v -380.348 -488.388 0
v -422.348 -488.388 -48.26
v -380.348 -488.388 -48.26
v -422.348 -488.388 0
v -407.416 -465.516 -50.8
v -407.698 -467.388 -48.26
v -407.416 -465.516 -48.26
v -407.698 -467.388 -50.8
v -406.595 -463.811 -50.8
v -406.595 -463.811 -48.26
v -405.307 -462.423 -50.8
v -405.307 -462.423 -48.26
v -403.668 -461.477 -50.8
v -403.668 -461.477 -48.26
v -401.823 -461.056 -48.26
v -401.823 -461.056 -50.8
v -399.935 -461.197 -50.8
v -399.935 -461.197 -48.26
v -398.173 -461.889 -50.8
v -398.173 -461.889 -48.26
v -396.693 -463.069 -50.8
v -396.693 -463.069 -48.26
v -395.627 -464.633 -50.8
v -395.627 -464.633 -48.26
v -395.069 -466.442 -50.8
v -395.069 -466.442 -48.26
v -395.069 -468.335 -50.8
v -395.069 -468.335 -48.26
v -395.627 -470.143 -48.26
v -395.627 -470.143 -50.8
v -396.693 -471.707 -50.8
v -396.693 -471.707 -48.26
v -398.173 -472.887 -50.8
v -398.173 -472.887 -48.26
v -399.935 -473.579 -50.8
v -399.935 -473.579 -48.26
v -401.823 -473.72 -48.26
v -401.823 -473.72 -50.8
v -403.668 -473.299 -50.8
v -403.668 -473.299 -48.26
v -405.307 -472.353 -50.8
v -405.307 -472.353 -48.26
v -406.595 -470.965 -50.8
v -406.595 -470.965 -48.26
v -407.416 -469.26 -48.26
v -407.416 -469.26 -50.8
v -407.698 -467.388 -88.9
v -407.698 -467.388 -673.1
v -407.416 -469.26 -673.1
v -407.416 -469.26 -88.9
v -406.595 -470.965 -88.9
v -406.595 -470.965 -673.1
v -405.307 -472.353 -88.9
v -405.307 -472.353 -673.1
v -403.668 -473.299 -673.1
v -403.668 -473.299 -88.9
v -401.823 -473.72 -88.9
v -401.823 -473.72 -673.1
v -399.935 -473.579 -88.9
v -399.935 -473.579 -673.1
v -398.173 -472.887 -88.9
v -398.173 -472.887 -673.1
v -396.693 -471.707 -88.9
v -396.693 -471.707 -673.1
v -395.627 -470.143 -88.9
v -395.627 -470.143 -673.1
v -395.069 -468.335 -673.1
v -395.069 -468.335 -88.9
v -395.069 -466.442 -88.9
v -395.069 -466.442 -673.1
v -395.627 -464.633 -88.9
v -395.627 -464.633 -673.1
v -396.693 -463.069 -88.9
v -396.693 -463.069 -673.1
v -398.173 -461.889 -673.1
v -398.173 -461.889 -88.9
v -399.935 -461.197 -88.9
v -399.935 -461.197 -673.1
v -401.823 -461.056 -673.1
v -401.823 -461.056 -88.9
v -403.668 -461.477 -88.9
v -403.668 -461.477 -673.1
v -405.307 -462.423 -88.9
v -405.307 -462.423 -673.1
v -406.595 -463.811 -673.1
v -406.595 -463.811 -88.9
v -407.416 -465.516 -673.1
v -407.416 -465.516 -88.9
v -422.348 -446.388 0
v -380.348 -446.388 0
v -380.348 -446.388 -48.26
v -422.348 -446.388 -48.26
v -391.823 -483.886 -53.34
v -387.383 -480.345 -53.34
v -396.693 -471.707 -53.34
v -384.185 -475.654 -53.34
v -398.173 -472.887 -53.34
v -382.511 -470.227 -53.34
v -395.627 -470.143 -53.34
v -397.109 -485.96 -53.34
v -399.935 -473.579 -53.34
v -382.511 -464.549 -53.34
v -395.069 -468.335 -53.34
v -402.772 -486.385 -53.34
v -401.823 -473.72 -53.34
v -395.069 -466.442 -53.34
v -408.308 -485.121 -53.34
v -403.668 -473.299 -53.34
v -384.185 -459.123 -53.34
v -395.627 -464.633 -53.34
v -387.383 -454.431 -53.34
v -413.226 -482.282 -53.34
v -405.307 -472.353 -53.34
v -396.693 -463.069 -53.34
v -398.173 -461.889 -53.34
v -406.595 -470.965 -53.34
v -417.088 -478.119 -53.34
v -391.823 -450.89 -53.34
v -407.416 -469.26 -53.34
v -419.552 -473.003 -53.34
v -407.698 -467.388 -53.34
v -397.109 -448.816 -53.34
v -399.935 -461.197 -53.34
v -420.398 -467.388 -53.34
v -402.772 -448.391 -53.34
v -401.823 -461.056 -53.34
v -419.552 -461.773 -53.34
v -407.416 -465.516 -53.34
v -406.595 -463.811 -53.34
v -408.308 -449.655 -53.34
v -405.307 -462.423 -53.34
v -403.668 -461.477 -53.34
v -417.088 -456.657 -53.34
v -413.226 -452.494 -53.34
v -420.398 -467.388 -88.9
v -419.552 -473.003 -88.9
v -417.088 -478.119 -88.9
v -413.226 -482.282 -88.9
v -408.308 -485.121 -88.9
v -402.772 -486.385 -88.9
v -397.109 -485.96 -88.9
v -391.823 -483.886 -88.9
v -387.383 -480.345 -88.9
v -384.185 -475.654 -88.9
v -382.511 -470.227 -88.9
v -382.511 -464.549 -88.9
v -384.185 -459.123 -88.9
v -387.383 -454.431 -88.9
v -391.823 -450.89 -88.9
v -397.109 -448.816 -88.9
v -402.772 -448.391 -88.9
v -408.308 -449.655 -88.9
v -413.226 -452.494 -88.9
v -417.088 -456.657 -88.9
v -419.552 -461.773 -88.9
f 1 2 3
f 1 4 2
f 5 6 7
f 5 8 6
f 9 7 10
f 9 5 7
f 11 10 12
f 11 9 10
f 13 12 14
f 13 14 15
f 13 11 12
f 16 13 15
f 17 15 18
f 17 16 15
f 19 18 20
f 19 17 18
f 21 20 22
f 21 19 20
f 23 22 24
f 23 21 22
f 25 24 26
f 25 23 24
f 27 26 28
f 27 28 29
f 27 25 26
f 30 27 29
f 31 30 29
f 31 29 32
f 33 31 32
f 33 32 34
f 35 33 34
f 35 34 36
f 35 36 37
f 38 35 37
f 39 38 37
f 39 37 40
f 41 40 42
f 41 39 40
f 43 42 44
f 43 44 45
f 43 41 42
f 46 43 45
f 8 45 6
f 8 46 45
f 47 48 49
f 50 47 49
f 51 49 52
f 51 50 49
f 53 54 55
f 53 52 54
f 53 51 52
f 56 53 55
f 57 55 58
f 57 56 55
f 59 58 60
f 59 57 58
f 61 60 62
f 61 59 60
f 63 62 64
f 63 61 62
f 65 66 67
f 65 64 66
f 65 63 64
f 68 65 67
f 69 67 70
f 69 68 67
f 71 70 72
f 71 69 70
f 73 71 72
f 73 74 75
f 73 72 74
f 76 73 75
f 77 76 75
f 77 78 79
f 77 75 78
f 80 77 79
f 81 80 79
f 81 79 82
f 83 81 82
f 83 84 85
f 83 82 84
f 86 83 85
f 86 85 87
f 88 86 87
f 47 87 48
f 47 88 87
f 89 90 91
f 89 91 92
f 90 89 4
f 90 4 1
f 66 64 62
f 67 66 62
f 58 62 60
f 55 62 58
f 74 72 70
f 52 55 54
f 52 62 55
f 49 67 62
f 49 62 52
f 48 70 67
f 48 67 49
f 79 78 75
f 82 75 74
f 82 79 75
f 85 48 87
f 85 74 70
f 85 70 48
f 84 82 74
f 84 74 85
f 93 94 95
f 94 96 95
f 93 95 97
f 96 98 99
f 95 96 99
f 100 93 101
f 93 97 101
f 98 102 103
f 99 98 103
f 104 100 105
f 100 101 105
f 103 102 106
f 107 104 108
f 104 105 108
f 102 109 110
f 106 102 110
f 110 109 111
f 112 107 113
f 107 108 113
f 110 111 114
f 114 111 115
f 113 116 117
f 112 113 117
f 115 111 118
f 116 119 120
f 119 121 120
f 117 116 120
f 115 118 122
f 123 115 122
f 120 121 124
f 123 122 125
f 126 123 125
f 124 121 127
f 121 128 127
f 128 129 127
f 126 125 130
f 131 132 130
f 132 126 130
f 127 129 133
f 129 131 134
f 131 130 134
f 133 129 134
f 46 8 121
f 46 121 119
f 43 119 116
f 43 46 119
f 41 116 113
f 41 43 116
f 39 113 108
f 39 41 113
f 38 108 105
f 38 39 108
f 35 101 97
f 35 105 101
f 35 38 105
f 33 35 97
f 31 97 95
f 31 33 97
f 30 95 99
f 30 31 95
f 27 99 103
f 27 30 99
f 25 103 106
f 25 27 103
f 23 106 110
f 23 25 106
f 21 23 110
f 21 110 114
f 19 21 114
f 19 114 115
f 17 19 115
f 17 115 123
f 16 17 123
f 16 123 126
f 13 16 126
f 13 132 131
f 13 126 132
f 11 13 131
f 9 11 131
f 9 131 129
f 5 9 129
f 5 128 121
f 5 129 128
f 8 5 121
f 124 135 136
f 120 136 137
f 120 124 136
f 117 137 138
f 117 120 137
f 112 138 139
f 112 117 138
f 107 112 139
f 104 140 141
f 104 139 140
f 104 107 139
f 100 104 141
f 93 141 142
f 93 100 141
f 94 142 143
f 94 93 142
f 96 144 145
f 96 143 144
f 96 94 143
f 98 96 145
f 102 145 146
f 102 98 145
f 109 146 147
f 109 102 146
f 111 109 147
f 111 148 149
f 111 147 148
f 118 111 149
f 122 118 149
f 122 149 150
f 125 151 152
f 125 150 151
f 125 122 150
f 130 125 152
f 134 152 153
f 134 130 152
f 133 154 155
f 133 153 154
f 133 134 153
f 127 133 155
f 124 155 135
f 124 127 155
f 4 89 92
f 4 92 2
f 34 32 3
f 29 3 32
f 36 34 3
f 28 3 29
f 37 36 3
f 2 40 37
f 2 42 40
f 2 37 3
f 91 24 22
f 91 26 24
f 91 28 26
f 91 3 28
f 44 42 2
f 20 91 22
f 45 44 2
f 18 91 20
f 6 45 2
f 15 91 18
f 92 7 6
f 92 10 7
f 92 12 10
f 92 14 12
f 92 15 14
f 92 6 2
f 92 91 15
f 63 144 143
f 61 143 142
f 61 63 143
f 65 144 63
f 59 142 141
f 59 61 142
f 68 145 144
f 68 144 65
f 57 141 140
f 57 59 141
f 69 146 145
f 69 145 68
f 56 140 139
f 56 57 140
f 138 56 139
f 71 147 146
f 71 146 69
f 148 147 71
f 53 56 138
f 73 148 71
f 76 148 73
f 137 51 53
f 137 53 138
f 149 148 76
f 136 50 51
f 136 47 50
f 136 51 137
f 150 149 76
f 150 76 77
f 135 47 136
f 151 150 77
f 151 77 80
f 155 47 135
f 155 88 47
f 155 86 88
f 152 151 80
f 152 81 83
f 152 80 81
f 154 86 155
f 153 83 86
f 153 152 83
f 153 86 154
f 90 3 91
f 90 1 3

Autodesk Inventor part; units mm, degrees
ref_plane "YZ Plane" through (0, 0, 0) normal (1, 0, 0) x (0, 1, 0)
ref_plane "XZ Plane" through (0, 0, 0) normal (0, 1, 0) x (-1, 0, 0)
ref_plane "XY Plane" through (0, 0, 0) normal (0, 0, 1) x (1, 0, 0)
ref_plane "Work Plane1" through (-337.8481, -441.0413, 0) normal (0, 0, 1) x (1, 0, 0)
sketch "Sketch1" plane through (-337.8481, -441.0413, 0) normal (0, 0, 1) x (1, 0, 0)
  line L0 (-84.5, -47.3468) -> (-42.5, -47.3468)
  line L1 (-42.5, -47.3468) -> (-42.5, -5.3468)
  line L2 (-42.5, -5.3468) -> (-84.5, -5.3468)
  line L3 (-84.5, -5.3468) -> (-84.5, -47.3468)
  line L4 (-84.5, -47.3468) -> (-42.5, -5.3468) construction
  line L5 (-42.5, -47.3468) -> (-84.5, -5.3468) construction
  point P0 (337.8481, 441.0413)
  point P1 (-63.5, -26.3468)
  dimension "d0" = 42
  dimension "d1" = 42
extrude "Extrusion1" add sketch "Sketch1" against normal blind 50.8
sketch "Sketch2" plane through (-337.8481, -441.0413, -50.8) normal (0, 0, -1) x (-1, 0, 0)
  line L0 (42.5, -47.3468) -> (84.5, -47.3468) projected
  line L1 (84.5, -47.3468) -> (84.5, -5.3468) projected
  line L2 (84.5, -5.3468) -> (42.5, -5.3468) projected
  line L3 (42.5, -5.3468) -> (42.5, -47.3468) projected
  circle A0 centre (63.5, -26.3468) radius 6.35
  point P0 (-337.8481, 441.0413)
  dimension "d4" = 12.7
extrude "Extrusion2" add sketch "Sketch2" along normal blind 622.3 contours A0
sketch "Sketch3" plane through (-337.8481, -441.0413, -50.8) normal (0, 0, -1) x (-1, 0, 0)
  circle A0 centre (63.5, -26.3468) radius 6.35 projected
  line L0 (42.5, -47.3468) -> (84.5, -47.3468) projected
  line L1 (84.5, -47.3468) -> (84.5, -5.3468) projected
  line L2 (84.5, -5.3468) -> (42.5, -5.3468) projected
  line L3 (42.5, -5.3468) -> (42.5, -47.3468) projected
  circle A1 centre (63.5, -26.3468) radius 19.05
  point P0 (-337.8481, 441.0413)
  dimension "d7" = 38.1
extrude "Extrusion3" add sketch "Sketch3" along normal blind 38.1 contours A1
sketch "Sketch4" plane through (-337.8481, -441.0413, -50.8) normal (0, 0, -1) x (-1, 0, 0)
  circle A0 centre (63.5, -26.3468) radius 19.05 projected
  line L0 (42.5, -47.3468) -> (84.5, -47.3468) projected
  line L1 (84.5, -47.3468) -> (84.5, -5.3468) projected
  line L2 (84.5, -5.3468) -> (42.5, -5.3468) projected
  line L3 (42.5, -5.3468) -> (42.5, -47.3468) projected
  circle A1 centre (63.5, -26.3468) radius 6.35 projected
  point P0 (-337.8481, 441.0413)
extrude "Extrusion4" cut sketch "Sketch4" along normal mid plane 5.08 contours A0 | L3 L2 L1 L0
properties part number "MotorandLeadscrew"
